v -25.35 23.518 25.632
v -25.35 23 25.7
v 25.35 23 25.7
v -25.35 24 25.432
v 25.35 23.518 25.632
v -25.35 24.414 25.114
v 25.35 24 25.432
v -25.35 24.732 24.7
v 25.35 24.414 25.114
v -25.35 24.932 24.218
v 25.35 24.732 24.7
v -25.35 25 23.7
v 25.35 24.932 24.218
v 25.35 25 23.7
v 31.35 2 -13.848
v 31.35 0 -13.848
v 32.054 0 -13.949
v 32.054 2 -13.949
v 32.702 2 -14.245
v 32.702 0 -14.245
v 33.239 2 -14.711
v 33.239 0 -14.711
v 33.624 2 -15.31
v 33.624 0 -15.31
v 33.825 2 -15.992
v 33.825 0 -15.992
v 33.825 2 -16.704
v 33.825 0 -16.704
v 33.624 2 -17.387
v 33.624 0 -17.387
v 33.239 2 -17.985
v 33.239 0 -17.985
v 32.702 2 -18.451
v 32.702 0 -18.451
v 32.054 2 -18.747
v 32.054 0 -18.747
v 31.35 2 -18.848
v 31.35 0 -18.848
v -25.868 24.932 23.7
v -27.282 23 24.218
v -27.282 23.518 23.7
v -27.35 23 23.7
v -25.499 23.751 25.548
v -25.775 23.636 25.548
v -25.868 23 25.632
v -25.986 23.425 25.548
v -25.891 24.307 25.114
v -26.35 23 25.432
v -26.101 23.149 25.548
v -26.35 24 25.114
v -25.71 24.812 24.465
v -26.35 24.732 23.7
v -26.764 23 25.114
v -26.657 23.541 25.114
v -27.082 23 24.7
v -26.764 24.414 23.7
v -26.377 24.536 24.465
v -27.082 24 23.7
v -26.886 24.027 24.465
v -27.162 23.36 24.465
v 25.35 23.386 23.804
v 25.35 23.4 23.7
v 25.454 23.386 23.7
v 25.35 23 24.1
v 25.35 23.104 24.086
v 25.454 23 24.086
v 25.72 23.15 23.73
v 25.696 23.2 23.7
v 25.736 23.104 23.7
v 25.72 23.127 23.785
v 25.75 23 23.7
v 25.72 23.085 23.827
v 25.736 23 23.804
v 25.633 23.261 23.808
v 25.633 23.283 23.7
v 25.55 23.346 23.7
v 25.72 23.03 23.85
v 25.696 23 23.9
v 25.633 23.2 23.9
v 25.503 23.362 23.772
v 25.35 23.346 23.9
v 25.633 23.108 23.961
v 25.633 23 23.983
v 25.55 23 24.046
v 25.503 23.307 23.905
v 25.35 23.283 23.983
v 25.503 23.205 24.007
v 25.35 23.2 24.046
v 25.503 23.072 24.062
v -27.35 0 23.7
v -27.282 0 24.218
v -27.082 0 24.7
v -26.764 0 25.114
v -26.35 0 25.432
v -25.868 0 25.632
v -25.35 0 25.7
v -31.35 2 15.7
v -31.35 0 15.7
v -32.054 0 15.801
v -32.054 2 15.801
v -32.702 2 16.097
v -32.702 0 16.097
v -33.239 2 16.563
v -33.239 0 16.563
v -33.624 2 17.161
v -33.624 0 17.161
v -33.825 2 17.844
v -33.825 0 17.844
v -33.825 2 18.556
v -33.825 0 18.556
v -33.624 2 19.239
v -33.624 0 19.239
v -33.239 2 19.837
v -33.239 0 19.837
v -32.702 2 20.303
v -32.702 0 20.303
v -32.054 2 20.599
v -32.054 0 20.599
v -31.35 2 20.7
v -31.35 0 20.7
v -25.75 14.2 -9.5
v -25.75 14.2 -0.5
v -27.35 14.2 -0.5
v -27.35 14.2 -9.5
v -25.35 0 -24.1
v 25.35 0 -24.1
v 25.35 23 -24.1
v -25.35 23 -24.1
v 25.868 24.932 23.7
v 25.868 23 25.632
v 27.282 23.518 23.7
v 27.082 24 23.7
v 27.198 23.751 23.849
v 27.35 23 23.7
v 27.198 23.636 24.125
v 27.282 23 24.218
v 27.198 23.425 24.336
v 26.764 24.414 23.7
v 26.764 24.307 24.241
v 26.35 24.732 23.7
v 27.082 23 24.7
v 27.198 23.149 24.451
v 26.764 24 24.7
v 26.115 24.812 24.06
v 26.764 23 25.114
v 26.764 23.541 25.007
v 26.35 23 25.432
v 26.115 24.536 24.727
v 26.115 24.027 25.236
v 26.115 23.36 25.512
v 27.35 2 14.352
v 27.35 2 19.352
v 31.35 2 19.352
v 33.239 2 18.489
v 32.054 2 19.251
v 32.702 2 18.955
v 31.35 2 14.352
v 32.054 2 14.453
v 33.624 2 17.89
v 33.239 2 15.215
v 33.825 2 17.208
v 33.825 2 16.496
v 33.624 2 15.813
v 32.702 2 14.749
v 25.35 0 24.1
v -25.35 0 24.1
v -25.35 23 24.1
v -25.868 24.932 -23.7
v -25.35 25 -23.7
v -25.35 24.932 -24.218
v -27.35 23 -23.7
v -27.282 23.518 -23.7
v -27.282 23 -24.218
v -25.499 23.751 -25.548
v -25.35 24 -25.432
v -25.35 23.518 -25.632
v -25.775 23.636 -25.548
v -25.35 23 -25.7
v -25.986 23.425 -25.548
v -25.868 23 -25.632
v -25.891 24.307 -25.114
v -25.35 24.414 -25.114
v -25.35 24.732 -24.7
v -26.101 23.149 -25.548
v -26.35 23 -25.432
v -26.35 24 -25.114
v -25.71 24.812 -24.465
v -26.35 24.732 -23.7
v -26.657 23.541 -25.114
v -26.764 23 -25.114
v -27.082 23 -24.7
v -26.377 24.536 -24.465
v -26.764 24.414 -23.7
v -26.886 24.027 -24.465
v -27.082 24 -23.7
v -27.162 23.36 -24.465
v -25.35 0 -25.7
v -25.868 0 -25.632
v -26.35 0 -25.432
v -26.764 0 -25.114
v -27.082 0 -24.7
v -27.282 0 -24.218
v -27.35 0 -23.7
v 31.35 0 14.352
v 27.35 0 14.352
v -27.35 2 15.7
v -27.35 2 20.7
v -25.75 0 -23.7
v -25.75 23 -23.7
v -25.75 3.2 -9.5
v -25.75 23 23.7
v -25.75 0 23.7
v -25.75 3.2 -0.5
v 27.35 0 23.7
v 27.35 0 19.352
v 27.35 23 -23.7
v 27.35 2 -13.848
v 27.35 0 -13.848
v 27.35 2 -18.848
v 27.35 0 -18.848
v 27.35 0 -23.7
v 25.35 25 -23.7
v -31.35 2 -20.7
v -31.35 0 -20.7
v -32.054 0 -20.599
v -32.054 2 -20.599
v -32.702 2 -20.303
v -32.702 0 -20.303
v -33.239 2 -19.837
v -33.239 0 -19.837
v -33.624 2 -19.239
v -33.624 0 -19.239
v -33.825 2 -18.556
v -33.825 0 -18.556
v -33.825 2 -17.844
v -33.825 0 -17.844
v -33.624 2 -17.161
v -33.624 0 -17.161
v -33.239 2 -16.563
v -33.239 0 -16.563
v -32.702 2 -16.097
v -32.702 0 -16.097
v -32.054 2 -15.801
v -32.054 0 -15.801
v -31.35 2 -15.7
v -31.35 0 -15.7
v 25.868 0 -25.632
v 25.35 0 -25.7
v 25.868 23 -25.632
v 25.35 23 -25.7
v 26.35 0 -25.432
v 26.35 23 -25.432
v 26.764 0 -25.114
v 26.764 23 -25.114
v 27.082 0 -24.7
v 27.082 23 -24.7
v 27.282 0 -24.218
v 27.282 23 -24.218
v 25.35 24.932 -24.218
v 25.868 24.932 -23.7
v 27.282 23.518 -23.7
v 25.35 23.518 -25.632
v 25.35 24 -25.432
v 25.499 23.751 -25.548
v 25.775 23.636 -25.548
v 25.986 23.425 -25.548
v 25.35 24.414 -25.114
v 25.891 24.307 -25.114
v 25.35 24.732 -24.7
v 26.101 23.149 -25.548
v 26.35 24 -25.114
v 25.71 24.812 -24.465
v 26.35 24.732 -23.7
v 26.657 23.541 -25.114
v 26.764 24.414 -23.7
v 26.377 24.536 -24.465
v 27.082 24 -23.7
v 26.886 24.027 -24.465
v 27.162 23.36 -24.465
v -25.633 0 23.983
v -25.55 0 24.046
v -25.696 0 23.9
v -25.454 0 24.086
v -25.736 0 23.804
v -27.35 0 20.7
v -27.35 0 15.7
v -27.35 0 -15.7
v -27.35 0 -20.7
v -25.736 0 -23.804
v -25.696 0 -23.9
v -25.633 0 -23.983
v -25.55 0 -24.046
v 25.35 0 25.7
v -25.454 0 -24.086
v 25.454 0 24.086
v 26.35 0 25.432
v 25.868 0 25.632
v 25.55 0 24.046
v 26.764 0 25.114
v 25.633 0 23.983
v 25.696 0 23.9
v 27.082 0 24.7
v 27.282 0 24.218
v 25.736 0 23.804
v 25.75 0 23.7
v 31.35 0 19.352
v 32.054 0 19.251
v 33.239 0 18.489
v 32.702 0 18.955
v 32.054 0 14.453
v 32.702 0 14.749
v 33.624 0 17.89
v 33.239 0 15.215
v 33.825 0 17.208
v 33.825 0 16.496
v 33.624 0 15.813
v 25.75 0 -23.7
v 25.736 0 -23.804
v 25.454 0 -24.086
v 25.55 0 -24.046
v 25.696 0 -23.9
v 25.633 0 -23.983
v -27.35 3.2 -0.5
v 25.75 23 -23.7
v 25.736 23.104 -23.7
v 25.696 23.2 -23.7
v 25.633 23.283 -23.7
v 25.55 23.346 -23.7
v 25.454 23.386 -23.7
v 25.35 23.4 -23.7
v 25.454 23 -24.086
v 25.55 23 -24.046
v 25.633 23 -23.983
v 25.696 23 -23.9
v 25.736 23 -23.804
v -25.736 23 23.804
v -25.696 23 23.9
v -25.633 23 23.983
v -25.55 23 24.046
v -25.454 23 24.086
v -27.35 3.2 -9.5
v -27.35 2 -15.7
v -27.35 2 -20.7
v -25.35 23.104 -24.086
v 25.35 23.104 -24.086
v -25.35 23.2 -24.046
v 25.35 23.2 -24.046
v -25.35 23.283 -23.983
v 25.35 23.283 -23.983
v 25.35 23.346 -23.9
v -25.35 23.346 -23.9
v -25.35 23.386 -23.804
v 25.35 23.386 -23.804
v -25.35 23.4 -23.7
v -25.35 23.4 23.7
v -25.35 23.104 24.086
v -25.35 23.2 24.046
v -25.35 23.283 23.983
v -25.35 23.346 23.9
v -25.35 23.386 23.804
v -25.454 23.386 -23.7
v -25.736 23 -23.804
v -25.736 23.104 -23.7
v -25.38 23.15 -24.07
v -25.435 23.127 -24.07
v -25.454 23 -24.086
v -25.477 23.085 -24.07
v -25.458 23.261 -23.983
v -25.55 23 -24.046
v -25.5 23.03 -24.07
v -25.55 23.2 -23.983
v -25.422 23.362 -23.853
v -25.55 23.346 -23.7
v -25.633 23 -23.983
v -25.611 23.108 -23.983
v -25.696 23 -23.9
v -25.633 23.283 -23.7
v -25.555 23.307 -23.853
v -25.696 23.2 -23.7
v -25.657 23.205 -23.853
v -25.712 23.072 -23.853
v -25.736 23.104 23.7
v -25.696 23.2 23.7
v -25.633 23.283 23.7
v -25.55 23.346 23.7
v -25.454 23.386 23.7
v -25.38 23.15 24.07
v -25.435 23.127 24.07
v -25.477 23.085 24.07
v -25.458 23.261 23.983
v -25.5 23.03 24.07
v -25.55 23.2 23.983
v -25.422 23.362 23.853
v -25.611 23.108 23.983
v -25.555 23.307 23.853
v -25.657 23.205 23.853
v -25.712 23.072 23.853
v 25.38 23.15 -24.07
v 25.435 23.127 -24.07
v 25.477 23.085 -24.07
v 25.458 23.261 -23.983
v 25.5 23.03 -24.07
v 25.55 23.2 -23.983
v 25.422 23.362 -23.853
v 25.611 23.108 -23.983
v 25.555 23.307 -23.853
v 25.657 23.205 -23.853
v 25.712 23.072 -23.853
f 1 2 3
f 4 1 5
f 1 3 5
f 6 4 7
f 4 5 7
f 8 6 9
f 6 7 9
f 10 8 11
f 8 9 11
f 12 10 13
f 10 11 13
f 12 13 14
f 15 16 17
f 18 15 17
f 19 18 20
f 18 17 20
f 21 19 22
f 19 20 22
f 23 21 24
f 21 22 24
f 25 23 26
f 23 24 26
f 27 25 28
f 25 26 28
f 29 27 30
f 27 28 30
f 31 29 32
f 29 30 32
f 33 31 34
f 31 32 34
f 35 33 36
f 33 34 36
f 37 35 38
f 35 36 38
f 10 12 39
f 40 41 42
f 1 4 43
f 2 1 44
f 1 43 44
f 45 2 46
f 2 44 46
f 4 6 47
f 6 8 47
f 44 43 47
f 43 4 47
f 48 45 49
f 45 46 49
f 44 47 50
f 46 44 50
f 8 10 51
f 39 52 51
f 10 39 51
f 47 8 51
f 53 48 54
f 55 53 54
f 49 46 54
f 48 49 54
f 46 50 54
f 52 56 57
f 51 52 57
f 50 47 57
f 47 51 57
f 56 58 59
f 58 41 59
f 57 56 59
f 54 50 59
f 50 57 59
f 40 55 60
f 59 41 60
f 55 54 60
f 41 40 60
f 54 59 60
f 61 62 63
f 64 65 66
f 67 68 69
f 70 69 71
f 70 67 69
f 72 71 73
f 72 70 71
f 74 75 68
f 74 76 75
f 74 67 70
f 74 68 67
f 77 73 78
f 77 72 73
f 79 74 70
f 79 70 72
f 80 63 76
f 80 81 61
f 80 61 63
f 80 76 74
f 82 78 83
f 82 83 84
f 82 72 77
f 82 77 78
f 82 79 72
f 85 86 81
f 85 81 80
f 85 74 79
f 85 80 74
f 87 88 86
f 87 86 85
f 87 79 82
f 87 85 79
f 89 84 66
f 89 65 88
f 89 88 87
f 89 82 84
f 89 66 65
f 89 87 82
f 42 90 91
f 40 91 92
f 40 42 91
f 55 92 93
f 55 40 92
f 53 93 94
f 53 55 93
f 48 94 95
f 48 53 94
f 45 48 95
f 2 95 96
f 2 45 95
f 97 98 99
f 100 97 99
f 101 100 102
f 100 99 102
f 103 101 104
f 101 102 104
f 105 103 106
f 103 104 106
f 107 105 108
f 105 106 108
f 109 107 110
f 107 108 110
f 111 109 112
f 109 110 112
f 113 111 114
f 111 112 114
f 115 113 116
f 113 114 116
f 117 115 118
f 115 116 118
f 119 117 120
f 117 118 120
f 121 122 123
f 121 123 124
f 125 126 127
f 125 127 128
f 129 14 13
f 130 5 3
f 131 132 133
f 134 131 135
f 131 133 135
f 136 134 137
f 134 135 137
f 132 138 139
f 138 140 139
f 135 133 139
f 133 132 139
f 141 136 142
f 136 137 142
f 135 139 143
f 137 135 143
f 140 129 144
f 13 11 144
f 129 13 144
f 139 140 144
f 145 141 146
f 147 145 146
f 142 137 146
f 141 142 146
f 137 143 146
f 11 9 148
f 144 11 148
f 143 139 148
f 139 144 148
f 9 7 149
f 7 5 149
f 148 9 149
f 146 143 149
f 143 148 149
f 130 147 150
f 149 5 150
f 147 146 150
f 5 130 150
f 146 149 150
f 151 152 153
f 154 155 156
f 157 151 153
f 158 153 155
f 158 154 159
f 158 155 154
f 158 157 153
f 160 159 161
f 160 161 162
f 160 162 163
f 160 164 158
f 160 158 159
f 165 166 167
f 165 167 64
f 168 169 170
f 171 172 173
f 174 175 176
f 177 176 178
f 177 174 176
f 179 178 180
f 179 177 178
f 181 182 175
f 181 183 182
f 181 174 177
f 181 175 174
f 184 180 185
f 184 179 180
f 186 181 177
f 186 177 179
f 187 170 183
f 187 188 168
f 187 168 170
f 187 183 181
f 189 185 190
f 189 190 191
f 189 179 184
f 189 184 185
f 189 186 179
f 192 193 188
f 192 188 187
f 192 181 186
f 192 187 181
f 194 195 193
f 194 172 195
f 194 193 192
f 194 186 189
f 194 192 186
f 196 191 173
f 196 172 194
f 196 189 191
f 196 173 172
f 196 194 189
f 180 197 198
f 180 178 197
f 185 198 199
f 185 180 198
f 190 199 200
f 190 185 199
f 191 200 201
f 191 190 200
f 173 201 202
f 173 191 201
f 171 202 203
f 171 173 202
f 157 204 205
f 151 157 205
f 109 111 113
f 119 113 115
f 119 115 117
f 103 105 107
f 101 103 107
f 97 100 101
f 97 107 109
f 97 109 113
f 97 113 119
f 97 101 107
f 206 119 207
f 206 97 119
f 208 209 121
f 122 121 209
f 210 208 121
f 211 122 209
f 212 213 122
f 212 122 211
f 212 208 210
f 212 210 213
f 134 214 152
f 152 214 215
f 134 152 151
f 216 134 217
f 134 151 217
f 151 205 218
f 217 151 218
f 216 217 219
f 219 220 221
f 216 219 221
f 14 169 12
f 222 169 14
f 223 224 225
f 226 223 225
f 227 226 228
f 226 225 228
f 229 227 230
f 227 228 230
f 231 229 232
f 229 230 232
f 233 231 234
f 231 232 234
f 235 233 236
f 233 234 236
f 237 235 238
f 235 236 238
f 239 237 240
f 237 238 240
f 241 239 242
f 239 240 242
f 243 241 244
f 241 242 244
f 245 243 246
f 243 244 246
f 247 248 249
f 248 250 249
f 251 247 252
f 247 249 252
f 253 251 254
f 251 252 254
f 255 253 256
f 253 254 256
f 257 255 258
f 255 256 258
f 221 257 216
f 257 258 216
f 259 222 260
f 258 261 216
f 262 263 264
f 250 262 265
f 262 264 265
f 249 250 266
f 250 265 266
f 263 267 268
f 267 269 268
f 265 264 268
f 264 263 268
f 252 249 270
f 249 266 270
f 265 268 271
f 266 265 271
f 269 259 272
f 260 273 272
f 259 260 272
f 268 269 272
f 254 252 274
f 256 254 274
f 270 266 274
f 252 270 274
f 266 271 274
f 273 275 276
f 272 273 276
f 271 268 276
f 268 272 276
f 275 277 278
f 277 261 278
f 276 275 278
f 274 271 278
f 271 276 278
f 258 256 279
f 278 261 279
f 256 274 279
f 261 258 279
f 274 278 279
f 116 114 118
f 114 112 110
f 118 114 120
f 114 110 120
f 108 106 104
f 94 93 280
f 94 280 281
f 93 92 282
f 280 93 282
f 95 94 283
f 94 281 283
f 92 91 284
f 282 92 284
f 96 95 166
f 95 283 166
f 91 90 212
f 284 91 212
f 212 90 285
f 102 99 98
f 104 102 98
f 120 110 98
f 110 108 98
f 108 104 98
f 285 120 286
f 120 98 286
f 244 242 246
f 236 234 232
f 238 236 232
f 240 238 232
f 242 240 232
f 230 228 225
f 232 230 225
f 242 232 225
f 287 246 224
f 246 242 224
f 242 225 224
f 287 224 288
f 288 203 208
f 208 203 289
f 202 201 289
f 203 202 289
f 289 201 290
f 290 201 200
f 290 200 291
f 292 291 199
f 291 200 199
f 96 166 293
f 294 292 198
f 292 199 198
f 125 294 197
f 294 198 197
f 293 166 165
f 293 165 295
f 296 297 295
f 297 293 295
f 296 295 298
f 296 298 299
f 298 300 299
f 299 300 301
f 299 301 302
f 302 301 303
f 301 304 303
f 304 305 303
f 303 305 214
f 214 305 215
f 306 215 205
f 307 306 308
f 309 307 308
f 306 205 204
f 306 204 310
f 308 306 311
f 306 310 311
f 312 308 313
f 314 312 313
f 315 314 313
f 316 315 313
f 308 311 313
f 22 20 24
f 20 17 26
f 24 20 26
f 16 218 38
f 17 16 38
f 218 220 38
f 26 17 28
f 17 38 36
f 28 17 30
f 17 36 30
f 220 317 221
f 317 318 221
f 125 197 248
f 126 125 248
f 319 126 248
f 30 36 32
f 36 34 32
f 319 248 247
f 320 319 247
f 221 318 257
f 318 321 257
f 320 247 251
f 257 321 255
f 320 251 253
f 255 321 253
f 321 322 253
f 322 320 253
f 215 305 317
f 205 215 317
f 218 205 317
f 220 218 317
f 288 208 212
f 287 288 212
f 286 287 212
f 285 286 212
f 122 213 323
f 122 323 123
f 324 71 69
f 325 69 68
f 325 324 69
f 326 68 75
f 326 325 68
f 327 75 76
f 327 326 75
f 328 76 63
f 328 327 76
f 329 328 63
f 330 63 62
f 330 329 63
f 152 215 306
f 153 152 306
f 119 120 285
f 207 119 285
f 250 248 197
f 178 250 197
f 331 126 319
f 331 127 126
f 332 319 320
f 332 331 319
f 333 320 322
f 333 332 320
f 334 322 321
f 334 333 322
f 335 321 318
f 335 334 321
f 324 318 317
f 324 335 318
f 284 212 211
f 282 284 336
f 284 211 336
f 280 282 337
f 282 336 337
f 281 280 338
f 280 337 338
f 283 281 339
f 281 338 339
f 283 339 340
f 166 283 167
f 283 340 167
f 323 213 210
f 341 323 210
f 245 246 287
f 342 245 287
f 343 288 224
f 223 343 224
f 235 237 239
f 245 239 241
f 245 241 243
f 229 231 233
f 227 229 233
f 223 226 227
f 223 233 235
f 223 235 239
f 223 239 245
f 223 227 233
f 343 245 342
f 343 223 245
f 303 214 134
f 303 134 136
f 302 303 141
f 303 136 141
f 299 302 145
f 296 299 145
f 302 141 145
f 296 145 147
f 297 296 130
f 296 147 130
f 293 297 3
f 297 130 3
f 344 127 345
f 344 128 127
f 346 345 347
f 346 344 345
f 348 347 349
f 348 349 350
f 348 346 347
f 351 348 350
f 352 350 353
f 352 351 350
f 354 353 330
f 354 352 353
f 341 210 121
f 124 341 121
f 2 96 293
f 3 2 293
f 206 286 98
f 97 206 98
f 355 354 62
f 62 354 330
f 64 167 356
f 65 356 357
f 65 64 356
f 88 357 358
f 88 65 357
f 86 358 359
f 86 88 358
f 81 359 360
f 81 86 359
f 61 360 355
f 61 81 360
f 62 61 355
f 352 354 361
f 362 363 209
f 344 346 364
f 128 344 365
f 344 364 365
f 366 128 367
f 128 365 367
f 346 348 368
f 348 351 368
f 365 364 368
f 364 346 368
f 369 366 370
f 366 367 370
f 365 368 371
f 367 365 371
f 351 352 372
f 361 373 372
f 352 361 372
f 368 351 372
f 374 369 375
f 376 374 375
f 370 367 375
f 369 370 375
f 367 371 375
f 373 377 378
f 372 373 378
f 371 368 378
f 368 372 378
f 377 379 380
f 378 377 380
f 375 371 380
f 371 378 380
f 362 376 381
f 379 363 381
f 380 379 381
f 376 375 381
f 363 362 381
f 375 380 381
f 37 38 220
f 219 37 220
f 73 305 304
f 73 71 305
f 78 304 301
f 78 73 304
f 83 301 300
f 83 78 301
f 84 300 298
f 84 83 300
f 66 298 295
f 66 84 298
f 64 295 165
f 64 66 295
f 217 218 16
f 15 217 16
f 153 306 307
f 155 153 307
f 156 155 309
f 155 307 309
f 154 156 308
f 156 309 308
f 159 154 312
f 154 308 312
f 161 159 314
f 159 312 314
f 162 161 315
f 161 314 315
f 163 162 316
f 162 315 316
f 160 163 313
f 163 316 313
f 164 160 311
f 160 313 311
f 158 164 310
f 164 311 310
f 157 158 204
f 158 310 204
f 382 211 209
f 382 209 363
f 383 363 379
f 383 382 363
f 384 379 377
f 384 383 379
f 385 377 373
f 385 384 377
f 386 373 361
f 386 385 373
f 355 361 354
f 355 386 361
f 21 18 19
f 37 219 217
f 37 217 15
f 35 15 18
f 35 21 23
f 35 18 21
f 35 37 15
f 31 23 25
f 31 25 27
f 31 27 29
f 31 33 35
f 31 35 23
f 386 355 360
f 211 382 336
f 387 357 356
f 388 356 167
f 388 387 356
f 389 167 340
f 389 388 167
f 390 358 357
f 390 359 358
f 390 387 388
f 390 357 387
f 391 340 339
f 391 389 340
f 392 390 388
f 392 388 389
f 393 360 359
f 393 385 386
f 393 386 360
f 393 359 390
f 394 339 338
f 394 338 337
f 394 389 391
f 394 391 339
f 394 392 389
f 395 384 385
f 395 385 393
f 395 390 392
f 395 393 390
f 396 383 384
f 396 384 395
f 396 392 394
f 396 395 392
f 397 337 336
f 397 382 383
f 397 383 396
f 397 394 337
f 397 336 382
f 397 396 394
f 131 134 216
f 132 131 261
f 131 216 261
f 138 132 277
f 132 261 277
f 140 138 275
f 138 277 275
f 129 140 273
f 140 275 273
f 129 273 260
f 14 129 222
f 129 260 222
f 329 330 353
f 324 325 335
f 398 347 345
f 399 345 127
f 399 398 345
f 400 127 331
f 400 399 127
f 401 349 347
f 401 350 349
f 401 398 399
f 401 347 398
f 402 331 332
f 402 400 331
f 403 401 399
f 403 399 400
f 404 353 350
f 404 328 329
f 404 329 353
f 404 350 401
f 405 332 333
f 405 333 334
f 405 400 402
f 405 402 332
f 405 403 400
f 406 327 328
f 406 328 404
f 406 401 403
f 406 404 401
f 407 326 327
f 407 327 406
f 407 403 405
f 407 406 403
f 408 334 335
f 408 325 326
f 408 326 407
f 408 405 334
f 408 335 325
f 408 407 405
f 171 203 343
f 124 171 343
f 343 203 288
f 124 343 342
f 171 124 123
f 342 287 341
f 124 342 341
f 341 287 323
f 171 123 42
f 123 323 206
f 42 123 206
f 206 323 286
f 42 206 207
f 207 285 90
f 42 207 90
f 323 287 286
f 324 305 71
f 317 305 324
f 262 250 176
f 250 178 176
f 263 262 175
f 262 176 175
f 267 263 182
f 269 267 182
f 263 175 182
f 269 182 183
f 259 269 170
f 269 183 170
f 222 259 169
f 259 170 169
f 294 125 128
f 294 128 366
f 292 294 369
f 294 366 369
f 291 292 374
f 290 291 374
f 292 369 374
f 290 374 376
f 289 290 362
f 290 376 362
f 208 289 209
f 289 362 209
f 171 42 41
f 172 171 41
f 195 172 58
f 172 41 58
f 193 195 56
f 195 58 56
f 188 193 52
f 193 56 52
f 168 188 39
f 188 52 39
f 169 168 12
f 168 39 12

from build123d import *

# Parameters (mm, degrees)
SKETCH1_W           = 54.7
SKETCH1_H           = 51.4
BOSS_EXTRUDE1_DEPTH = 25
FILLET1_R           = 2
SHELL1_T            = -1.6
BOSS_EXTRUDE2_DEPTH = 2
SKETCH2_W           = 9
SKETCH2_H           = 11
CUT_EXTRUDE1_DEPTH  = 70.553217036


with BuildPart() as part:
    # Sketch1 → Boss-Extrude1 (new body)
    with BuildSketch(Plane(origin=(0, 0, 0), x_dir=(1, 0, 0), z_dir=(0, 1, 0))):
        Rectangle(SKETCH1_W, SKETCH1_H)
    extrude(amount=BOSS_EXTRUDE1_DEPTH)

    # Fillet1
    fillet1_edges = [part.edges().sort_by_distance(p)[0] for p in [
        (-27.35, 12.5, -25.7),
        (27.35, 12.5, -25.7),
        (0, 25, -25.7),
        (-27.35, 25, 0),
        (-27.35, 12.5, 25.7),
        (0, 25, 25.7),
        (27.35, 25, 0),
        (27.35, 12.5, 25.7),
    ]]
    fillet(fillet1_edges, radius=FILLET1_R)

    # Shell1
    shell1_openings = [part.faces().sort_by_distance(p)[0] for p in [
        (0, 0, 0),
    ]]
    offset(amount=SHELL1_T, openings=shell1_openings, kind=Kind.INTERSECTION)

    # Sketch1<3> → Boss-Extrude2 (add)
    with BuildSketch(Plane(origin=(0, 0, 0), x_dir=(1, 0, 0), z_dir=(0, 1, 0))):
        with BuildLine():
            Line((31.35, 18.848211449), (27.35, 18.848211449))
            Line((27.35, 18.848211449), (27.35, 13.848211449))
            Line((27.35, 13.848211449), (31.35, 13.848211449))
            ThreePointArc((31.35, 13.848211449), (33.85, 16.348211449), (31.35, 18.848211449))
        make_face()
        with BuildLine():
            Line((-27.35, 15.7), (-27.35, 20.7))
            Line((-27.35, 20.7), (-31.35, 20.7))
            ThreePointArc((-31.35, 20.7), (-33.85, 18.2), (-31.35, 15.7))
            Line((-31.35, 15.7), (-27.35, 15.7))
        make_face()
        with BuildLine():
            Line((31.35, -14.351788551), (27.35, -14.351788551))
            Line((27.35, -14.351788551), (27.35, -19.351788551))
            Line((27.35, -19.351788551), (31.35, -19.351788551))
            ThreePointArc((31.35, -19.351788551), (33.85, -16.851788551), (31.35, -14.351788551))
        make_face()
        with BuildLine():
            Line((-27.35, -20.7), (-27.35, -15.7))
            Line((-27.35, -15.7), (-31.35, -15.7))
            ThreePointArc((-31.35, -15.7), (-33.85, -18.2), (-31.35, -20.7))
            Line((-31.35, -20.7), (-27.35, -20.7))
        make_face()
    extrude(amount=BOSS_EXTRUDE2_DEPTH)

    # Sketch2 → Cut-Extrude1 (cut, through all)
    with BuildSketch(Plane(origin=(-25.75, 0, 0), x_dir=(0, 0, -1), z_dir=(1, 0, 0))):
        with Locations((5, 8.7)):
            Rectangle(SKETCH2_W, SKETCH2_H)
    extrude(amount=-CUT_EXTRUDE1_DEPTH, mode=Mode.SUBTRACT)


solid = part.part
